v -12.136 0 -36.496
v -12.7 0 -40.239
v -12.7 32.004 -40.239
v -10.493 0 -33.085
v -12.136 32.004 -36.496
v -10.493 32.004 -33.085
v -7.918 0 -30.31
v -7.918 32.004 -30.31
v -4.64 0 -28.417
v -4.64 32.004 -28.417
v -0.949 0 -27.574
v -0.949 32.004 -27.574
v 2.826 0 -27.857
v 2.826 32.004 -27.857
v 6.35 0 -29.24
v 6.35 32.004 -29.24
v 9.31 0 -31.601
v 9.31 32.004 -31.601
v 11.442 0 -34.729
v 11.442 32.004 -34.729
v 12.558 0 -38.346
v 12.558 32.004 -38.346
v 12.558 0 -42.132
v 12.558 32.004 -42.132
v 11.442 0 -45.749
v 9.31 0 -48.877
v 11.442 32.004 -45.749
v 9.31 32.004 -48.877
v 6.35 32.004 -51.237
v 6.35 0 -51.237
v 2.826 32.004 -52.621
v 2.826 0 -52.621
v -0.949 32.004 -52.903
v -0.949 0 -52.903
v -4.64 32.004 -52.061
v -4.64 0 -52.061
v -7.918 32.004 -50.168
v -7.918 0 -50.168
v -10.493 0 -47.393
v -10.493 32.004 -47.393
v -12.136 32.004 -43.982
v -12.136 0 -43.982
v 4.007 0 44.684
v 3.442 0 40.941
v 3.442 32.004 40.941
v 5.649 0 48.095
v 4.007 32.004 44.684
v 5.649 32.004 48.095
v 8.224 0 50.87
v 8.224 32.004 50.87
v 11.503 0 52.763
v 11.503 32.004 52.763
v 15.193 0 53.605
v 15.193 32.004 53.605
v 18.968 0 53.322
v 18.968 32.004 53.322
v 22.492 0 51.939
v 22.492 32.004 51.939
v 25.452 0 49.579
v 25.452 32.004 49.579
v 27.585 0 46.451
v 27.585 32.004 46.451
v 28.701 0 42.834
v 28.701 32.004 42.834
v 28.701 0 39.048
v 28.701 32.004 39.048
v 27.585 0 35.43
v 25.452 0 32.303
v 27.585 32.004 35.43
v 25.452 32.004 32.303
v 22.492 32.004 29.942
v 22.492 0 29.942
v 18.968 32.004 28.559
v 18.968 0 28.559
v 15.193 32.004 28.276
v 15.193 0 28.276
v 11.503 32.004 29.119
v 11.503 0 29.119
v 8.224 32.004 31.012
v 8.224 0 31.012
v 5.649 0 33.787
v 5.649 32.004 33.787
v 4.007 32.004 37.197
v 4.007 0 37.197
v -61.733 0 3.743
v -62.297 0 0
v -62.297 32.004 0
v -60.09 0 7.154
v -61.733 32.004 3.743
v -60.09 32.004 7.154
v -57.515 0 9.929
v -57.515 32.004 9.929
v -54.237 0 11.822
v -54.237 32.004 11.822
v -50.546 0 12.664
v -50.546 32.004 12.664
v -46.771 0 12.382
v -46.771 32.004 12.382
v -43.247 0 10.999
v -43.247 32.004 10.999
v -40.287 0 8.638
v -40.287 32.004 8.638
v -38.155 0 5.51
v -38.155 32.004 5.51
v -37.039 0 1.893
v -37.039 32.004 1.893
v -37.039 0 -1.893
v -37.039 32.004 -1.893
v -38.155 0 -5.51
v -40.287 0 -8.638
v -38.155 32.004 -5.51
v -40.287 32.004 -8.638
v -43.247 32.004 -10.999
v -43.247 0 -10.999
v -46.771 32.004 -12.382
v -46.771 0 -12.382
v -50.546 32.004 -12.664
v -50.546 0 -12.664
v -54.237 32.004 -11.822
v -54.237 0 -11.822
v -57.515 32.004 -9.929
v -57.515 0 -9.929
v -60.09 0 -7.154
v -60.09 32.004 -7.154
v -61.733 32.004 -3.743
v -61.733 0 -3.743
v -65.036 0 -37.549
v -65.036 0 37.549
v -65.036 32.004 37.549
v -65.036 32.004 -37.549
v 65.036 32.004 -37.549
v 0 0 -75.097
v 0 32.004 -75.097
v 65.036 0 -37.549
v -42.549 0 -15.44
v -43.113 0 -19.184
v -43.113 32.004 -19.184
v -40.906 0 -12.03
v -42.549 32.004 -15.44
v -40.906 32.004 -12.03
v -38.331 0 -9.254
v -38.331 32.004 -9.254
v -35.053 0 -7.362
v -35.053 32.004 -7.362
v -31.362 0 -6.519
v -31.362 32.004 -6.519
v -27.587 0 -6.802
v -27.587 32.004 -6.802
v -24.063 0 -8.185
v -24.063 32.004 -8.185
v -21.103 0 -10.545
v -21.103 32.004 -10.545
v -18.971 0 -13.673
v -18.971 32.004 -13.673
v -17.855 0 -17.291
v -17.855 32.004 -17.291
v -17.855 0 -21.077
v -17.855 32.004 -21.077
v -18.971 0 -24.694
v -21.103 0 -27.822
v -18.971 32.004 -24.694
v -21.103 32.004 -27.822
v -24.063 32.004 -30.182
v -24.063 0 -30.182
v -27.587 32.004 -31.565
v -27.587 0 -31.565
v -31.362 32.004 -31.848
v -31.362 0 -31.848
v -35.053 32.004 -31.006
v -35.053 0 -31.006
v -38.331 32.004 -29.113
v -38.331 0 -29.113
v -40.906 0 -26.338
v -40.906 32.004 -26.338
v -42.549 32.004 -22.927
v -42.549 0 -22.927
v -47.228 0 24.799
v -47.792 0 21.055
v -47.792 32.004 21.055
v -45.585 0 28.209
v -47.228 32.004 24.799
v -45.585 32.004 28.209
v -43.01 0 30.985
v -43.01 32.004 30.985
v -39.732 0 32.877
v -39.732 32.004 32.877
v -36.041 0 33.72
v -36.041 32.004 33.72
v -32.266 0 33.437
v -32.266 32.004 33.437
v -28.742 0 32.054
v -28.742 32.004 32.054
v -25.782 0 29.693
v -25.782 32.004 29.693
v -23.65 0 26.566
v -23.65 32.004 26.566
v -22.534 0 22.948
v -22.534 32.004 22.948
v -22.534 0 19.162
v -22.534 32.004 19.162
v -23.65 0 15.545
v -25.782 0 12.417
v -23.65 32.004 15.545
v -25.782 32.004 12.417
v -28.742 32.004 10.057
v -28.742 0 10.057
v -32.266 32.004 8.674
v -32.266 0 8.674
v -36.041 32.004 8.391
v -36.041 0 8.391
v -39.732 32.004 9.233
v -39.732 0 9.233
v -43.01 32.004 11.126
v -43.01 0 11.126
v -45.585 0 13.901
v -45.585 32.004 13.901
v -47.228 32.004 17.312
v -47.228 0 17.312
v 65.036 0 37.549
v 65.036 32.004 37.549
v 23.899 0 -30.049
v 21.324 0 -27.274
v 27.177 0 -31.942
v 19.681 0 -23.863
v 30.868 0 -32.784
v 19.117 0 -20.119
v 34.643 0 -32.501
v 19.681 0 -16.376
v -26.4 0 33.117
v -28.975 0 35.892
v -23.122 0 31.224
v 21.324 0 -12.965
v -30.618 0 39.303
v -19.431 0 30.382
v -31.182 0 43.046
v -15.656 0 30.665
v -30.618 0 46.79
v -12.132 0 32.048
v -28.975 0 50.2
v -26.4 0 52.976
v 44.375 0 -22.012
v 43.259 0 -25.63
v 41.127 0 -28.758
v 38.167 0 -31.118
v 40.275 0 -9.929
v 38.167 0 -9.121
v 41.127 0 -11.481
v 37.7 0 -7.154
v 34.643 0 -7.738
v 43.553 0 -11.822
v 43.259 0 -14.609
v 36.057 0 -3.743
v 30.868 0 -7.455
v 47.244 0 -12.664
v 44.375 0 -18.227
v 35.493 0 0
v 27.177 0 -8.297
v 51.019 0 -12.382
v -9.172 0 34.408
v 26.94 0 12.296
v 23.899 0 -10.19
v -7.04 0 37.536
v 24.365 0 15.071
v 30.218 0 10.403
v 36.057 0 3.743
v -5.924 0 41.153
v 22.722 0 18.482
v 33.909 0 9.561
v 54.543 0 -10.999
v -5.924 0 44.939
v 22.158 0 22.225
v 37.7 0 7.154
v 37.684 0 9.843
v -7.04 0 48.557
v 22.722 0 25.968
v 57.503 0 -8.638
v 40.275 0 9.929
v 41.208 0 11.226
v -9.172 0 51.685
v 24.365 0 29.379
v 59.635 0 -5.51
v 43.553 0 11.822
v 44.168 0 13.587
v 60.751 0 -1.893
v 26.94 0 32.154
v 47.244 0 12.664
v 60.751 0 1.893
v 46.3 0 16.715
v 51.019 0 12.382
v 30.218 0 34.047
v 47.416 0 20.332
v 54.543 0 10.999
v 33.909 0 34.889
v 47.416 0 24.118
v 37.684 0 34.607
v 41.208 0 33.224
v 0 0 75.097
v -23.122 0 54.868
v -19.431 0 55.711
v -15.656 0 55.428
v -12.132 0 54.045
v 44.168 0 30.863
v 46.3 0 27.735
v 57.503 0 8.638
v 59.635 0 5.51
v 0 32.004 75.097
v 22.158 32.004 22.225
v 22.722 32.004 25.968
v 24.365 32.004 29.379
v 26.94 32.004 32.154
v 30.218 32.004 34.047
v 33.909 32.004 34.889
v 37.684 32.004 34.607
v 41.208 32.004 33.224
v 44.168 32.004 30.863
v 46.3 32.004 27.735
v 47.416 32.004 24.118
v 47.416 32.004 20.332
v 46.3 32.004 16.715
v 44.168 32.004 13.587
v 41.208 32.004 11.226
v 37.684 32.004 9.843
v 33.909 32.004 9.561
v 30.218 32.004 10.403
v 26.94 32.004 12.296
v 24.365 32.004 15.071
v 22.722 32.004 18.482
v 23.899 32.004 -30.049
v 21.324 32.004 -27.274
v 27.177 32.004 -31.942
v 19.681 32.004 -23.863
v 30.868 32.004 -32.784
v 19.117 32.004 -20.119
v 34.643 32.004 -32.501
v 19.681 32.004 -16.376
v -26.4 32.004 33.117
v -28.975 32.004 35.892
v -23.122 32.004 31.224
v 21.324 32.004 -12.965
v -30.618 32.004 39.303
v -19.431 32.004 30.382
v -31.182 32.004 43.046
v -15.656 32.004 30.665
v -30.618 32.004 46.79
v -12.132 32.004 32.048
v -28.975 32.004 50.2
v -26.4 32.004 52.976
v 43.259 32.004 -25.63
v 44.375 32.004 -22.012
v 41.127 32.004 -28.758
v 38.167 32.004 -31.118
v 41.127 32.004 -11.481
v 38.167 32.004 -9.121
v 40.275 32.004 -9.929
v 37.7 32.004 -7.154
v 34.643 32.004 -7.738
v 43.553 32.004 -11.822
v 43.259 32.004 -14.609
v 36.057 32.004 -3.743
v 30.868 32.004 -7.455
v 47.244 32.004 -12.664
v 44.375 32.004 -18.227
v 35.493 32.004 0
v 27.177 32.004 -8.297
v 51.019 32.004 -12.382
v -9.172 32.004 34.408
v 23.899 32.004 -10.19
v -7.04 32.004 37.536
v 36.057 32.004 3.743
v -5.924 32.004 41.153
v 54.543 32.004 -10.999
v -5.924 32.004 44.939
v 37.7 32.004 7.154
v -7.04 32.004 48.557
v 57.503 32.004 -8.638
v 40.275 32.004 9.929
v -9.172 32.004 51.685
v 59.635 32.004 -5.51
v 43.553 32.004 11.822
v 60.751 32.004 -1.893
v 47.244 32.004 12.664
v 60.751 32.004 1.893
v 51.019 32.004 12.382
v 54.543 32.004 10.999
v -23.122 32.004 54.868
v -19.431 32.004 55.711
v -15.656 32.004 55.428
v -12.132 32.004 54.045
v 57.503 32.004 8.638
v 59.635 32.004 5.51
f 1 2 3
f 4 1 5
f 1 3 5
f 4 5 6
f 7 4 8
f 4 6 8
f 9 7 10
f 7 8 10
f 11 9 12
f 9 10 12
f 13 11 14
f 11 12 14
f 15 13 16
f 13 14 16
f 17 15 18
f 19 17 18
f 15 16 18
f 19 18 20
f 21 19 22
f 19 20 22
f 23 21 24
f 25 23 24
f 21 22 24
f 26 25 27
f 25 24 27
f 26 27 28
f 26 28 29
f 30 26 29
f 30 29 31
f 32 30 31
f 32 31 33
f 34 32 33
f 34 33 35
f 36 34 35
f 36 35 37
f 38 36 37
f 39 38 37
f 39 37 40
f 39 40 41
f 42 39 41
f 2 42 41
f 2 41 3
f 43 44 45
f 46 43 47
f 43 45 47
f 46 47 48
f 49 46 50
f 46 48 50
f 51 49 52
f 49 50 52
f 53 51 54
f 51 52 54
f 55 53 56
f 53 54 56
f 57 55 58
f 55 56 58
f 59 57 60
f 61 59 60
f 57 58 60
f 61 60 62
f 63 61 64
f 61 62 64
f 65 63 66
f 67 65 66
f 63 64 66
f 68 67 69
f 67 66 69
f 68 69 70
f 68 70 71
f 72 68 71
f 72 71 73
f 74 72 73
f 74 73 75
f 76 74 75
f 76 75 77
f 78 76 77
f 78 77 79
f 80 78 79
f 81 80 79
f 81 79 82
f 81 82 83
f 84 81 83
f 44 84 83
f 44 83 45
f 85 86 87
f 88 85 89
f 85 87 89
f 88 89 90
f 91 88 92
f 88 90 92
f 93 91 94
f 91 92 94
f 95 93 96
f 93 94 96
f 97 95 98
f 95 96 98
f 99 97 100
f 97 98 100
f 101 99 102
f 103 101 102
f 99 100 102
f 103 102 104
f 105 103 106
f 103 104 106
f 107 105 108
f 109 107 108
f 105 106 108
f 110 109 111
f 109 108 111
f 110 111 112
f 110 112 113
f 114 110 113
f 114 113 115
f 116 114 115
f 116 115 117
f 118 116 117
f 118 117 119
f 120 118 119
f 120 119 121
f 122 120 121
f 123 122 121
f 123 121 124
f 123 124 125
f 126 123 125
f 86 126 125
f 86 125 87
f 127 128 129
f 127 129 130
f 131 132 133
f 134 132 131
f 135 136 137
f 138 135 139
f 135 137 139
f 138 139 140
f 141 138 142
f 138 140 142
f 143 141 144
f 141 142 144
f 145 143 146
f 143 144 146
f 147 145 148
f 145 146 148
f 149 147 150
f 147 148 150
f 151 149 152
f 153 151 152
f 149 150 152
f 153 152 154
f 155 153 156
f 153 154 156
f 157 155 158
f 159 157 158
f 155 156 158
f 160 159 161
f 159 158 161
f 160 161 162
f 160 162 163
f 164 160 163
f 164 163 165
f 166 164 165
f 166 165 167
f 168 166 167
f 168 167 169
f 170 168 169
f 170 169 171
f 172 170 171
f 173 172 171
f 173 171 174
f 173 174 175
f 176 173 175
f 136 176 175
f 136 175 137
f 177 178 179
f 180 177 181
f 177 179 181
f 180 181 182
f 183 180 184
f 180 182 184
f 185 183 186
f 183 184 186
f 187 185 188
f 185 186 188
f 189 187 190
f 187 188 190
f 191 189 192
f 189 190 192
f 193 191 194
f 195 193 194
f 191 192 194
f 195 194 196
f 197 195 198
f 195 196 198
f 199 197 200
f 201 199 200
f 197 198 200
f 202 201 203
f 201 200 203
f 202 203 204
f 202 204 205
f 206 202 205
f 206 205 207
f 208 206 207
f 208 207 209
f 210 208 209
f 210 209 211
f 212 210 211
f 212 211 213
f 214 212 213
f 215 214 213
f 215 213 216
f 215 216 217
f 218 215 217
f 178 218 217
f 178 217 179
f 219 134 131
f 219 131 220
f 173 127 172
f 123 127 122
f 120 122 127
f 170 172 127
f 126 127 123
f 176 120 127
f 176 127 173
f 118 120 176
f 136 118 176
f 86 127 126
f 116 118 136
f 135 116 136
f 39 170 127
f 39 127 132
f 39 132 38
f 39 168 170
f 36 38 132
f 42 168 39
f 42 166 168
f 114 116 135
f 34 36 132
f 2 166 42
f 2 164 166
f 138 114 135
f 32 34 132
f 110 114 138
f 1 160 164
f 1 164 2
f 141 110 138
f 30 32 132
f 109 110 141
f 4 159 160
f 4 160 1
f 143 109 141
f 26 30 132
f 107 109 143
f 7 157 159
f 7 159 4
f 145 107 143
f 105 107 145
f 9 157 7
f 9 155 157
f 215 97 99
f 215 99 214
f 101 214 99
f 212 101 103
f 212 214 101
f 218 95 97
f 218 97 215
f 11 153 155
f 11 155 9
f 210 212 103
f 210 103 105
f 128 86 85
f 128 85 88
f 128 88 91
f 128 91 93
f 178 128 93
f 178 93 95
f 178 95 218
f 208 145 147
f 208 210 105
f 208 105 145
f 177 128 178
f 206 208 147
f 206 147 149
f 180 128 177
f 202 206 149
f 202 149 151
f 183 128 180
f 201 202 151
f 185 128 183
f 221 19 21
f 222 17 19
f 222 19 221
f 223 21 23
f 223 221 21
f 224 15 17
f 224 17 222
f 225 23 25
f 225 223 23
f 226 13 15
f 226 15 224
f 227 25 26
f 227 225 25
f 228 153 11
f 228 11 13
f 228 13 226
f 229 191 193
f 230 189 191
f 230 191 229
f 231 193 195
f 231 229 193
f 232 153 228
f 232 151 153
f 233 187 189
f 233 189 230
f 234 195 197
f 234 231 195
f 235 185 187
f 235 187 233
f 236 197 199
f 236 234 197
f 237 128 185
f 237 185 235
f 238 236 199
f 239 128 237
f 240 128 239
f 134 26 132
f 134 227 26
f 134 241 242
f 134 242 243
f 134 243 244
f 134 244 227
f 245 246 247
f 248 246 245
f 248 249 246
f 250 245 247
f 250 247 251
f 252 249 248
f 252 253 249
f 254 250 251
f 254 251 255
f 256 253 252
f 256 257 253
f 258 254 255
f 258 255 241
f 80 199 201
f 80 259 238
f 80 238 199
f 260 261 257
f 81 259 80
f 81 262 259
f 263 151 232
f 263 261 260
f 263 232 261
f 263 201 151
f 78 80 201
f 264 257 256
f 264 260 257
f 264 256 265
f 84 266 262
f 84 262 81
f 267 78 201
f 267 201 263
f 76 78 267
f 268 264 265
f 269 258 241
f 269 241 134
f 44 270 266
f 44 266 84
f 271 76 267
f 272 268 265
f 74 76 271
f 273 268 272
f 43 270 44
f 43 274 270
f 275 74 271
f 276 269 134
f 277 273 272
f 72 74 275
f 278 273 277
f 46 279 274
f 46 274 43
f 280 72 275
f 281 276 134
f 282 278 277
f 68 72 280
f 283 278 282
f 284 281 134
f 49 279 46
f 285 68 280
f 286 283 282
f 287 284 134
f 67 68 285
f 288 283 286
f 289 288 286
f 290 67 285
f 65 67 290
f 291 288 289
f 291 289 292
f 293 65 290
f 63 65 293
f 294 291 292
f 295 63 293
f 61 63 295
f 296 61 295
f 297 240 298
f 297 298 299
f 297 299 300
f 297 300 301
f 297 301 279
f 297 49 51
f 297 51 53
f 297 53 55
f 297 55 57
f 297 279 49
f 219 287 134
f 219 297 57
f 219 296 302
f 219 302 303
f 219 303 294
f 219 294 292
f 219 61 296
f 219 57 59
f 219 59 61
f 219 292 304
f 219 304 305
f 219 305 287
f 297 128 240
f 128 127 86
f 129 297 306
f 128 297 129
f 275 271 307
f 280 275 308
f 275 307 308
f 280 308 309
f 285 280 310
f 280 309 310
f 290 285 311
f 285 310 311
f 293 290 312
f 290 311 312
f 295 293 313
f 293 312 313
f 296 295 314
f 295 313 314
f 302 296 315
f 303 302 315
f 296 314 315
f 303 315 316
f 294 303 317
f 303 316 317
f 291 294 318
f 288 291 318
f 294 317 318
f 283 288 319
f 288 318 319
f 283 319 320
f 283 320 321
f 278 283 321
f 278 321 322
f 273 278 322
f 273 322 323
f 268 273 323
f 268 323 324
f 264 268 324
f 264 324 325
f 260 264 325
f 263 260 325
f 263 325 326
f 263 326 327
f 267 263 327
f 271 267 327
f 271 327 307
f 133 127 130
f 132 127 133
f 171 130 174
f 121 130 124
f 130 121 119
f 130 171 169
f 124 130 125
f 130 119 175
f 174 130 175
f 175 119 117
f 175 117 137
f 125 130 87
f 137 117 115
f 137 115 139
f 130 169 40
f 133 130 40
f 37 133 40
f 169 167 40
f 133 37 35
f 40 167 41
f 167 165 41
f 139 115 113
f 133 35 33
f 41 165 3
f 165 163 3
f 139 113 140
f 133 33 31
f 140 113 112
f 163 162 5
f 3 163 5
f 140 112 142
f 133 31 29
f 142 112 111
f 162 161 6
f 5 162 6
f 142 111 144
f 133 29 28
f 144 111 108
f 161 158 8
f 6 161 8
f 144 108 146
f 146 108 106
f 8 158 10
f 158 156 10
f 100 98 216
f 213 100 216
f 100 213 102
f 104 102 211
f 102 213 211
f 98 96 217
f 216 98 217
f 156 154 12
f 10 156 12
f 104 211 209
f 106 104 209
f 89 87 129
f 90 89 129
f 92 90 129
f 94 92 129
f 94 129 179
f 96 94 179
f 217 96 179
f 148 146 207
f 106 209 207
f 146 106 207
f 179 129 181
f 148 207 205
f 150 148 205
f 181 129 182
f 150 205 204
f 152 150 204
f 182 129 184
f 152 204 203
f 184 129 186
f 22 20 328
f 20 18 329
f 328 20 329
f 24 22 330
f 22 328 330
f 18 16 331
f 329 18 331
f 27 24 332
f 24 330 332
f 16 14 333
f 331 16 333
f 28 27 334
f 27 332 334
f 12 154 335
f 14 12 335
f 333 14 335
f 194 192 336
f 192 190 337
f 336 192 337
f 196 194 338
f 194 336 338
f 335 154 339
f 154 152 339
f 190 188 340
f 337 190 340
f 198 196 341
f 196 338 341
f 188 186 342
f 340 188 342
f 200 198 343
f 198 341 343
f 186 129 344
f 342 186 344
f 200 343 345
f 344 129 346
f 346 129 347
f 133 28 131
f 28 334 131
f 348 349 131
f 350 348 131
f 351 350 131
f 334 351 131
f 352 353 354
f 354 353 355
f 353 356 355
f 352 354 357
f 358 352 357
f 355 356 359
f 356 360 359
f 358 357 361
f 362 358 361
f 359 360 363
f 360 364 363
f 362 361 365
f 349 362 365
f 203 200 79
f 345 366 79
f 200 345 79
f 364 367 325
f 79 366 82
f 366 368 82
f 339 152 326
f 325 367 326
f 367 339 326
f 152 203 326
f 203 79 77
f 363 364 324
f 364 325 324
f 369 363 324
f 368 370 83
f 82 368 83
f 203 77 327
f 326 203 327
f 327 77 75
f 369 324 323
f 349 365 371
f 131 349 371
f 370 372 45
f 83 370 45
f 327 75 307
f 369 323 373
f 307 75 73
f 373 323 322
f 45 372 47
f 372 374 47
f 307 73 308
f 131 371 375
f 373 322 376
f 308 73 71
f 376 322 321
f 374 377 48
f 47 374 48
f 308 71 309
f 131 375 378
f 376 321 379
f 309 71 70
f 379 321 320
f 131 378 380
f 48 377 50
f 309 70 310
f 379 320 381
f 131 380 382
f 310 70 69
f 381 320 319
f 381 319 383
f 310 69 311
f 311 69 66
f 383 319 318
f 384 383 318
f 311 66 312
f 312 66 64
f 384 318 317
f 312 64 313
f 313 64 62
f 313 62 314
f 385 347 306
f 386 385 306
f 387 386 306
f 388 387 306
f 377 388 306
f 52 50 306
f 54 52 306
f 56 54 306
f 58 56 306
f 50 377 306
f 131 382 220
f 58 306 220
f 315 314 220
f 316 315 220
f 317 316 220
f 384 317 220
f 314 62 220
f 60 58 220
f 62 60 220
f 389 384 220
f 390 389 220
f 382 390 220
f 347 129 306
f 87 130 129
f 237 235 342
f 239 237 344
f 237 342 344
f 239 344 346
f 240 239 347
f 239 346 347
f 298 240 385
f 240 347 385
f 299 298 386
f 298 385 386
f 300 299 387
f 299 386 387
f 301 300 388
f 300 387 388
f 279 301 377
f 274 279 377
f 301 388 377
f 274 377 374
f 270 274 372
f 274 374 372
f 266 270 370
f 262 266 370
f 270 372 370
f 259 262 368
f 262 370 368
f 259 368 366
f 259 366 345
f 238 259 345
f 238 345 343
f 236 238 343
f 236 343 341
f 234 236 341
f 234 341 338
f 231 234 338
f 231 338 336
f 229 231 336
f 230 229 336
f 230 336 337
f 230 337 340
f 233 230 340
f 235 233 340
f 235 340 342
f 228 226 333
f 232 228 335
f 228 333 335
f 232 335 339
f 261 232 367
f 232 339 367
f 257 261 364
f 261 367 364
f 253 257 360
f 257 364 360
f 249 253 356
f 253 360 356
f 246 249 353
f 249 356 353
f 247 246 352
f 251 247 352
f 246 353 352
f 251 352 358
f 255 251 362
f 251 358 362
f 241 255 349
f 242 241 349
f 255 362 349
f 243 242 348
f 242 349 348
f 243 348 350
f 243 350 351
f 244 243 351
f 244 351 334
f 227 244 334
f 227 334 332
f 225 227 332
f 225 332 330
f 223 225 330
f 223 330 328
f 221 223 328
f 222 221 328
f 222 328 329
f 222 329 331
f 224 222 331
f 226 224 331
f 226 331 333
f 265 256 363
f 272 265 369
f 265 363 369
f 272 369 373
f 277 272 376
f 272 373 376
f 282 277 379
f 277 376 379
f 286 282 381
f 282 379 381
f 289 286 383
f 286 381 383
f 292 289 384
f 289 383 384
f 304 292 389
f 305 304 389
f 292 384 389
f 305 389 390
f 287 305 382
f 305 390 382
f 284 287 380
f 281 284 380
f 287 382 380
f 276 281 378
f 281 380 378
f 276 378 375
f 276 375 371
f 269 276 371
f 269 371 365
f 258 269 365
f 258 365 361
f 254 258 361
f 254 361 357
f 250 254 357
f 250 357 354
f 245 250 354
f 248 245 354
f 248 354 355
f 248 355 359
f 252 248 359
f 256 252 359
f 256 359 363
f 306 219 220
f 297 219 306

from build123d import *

# Parameters (mm, degrees)
F8_DEPTH = 32.004
F9_D     = 25.4


with BuildPart() as f8:
    # F0 (on Front) → F8 (new body)
    with BuildSketch(Plane.XZ):
        Polygon((65.036002, -37.548553), (65.036002, 37.548553), (0, 75.097106), (-65.036002, 37.548553), (-65.036002, -37.548553), (0, -75.097106), align=None)
    extrude(amount=-F8_DEPTH)

    # F9 (through all)
    with Locations(Plane.XZ):
        with Locations((-18.481843, 43.046314), (16.14237, 40.940791), (34.85816, 22.225002), (48.19316, 0), (0, -40.238947), (-30.413158, -19.183684), (-49.596842, 0), (-35.092108, 21.055264), (31.81684, -20.119473)):
            Hole(F9_D / 2)


solid = f8.part
